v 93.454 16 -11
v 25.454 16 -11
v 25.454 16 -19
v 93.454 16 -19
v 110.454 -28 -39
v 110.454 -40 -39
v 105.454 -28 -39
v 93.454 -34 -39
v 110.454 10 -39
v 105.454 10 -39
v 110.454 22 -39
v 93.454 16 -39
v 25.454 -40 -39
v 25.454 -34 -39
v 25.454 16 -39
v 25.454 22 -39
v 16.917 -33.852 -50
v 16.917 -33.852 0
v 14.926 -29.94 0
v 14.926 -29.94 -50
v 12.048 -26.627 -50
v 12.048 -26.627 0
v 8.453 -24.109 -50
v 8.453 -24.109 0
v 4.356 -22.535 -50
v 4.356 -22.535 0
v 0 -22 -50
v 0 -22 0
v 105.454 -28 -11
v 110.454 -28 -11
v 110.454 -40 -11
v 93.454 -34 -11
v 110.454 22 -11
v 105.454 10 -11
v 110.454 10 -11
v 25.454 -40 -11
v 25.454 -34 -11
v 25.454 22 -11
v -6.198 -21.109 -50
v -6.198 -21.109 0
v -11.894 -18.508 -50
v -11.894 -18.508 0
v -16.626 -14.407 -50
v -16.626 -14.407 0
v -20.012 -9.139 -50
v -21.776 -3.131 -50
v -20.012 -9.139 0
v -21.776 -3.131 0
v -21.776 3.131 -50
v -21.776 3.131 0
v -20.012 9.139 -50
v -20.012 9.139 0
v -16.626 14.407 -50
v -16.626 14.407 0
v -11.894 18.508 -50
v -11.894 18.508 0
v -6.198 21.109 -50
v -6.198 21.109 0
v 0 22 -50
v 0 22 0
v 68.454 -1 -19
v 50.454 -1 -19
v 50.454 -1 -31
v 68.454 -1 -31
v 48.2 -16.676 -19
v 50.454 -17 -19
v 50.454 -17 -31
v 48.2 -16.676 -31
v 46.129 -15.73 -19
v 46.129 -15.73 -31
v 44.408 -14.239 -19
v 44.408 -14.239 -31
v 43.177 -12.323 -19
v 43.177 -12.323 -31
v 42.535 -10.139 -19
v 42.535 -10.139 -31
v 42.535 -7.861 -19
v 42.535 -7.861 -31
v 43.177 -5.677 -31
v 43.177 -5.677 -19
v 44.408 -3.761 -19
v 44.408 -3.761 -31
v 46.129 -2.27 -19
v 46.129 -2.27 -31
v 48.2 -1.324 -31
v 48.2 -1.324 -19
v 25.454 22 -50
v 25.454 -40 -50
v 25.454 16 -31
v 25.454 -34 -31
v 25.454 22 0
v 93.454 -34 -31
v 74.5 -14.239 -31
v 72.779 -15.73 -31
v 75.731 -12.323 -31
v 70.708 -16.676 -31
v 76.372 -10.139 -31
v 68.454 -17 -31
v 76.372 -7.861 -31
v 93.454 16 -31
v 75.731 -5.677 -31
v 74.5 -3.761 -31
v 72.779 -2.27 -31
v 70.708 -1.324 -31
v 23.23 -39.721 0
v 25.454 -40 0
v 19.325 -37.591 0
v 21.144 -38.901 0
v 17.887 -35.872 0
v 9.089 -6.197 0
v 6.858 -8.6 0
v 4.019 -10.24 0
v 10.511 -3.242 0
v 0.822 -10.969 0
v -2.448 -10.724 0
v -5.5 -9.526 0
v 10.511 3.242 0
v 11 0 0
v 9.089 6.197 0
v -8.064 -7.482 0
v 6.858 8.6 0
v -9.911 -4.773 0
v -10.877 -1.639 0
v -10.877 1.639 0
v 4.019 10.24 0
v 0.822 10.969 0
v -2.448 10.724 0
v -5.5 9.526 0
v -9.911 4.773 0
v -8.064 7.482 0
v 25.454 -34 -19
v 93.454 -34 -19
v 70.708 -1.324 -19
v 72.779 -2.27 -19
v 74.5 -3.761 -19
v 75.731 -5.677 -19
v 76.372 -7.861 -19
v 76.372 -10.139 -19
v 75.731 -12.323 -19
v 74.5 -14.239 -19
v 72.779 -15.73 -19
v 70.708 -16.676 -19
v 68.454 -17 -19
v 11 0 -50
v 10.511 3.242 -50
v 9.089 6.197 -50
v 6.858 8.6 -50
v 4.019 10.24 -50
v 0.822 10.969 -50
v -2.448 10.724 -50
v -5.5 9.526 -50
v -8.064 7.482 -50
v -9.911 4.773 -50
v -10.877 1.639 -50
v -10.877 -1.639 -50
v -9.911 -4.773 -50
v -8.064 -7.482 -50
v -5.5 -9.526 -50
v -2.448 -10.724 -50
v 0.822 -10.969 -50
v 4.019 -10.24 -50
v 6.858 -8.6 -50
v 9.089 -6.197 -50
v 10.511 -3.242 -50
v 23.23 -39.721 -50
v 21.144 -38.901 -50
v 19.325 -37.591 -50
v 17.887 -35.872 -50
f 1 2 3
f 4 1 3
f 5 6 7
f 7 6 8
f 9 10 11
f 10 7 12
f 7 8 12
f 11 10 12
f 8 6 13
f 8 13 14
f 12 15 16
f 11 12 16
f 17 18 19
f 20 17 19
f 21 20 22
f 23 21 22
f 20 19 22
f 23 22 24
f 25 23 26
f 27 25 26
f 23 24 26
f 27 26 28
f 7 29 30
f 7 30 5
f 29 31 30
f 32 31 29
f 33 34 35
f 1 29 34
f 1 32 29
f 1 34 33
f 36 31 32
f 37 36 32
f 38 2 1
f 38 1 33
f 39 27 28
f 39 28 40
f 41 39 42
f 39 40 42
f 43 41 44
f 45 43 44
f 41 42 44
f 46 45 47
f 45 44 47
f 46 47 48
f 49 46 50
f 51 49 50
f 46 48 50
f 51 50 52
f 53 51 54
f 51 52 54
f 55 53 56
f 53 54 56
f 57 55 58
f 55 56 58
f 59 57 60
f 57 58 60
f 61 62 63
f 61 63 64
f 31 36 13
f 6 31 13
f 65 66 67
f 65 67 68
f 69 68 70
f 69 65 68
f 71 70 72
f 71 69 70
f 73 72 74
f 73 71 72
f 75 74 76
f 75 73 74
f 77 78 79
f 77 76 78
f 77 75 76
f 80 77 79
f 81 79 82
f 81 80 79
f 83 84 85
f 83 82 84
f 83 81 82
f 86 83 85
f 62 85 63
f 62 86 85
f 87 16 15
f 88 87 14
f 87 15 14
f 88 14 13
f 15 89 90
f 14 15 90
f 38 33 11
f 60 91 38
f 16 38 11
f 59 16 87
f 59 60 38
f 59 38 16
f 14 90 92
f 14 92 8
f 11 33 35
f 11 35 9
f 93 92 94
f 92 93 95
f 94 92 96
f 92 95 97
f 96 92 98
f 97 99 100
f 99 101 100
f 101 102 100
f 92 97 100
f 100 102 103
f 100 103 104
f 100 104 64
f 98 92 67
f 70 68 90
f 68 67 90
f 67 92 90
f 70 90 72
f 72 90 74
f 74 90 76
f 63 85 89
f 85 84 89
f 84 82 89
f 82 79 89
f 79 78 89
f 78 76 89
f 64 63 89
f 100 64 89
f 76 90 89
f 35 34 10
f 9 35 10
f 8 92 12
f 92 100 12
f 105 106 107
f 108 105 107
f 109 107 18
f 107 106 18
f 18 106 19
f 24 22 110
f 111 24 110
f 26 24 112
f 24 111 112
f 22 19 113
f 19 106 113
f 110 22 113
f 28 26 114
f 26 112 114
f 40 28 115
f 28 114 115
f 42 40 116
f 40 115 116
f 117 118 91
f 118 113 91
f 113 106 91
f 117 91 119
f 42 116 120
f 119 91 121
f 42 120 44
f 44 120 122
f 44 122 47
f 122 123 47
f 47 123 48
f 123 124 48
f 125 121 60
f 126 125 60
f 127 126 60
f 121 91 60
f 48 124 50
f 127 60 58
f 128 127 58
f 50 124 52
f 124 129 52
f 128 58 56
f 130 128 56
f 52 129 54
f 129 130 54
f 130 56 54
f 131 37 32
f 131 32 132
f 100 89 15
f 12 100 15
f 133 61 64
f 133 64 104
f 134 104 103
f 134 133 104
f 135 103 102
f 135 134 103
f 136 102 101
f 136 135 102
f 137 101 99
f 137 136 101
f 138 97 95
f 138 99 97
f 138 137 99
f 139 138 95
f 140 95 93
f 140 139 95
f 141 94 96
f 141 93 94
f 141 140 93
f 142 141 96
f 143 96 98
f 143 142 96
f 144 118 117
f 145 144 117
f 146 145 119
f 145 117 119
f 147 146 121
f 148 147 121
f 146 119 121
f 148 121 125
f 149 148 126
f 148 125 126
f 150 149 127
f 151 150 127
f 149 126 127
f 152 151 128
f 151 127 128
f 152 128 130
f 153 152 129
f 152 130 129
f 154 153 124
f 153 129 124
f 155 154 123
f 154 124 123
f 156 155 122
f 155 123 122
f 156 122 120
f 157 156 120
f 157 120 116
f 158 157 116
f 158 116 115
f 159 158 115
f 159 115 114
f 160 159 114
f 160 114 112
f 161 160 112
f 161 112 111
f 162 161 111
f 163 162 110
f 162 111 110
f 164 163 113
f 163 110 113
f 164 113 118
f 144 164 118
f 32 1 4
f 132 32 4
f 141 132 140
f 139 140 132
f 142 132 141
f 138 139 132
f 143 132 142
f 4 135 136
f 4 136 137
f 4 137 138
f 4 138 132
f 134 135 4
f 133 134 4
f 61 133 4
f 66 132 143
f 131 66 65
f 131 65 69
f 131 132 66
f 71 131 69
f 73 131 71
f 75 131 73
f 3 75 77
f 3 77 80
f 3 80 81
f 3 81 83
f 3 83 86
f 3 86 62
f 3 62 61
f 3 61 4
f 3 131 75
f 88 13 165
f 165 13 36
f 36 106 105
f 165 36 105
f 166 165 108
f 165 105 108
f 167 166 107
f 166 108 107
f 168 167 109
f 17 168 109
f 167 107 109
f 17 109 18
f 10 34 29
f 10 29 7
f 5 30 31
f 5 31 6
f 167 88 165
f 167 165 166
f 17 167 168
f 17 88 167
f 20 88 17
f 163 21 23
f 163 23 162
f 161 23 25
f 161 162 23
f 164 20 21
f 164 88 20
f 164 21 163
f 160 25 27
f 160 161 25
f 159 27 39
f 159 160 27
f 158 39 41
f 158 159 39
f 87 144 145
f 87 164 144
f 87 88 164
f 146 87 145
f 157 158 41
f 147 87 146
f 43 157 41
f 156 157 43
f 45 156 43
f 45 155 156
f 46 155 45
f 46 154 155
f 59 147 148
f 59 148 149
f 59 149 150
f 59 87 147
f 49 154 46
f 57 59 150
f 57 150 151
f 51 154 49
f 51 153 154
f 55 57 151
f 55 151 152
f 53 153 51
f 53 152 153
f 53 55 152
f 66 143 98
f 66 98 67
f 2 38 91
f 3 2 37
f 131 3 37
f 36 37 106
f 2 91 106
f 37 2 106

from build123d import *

# Parameters (mm, degrees)
SKETCH1_R           = 11
BOSS_EXTRUDE1_DEPTH = 50
SKETCH2_W           = 28
SKETCH2_H           = 6
BOSS_EXTRUDE2_DEPTH = 68
SKETCH3_W           = 12
SKETCH3_H           = 50
BOSS_EXTRUDE3_DEPTH = 68
SKETCH4_W           = 28
SKETCH4_H           = 62
BOSS_EXTRUDE4_DEPTH = 12
SKETCH5_W           = 28
SKETCH5_H           = 12
BOSS_EXTRUDE5_DEPTH = 5
CUT_EXTRUDE1_DEPTH  = 122.49490099


with BuildPart() as part:
    # Sketch1 → Boss-Extrude1 (new body)
    with BuildSketch(Plane.XY):
        with BuildLine():
            Line((0, 22), (25.453659816, 22))
            Line((25.453659816, 22), (25.453659816, -40))
            ThreePointArc((25.453659816, -40), (20.193625944, -38.302879135), (16.917350568, -33.851565259))
            ThreePointArc((16.917350568, -33.851565259), (10.327830718, -25.257682927), (0, -22))
            ThreePointArc((0, -22), (-22, 0), (0, 22))
        make_face()
        Circle(SKETCH1_R, mode=Mode.SUBTRACT)
    extrude(amount=-BOSS_EXTRUDE1_DEPTH)

    # Sketch2 → Boss-Extrude2 (add)
    with BuildSketch(Plane(origin=(25.453659816, 0, 0), x_dir=(0, 0, -1), z_dir=(1, 0, 0))):
        with Locations((25, 19)):
            Rectangle(SKETCH2_W, SKETCH2_H)
        with Locations((25, -37)):
            Rectangle(SKETCH2_W, SKETCH2_H)
    extrude(amount=BOSS_EXTRUDE2_DEPTH)

    # Sketch3 → Boss-Extrude3 (add)
    with BuildSketch(Plane(origin=(25.453659816, 0, 0), x_dir=(0, 0, -1), z_dir=(1, 0, 0))):
        with Locations((25, -9)):
            Rectangle(SKETCH3_W, SKETCH3_H)
    extrude(amount=BOSS_EXTRUDE3_DEPTH)

    # Sketch4 → Boss-Extrude4 (add)
    with BuildSketch(Plane(origin=(93.453659816, 0, 0), x_dir=(0, 0, -1), z_dir=(1, 0, 0))):
        with Locations((25, -9)):
            Rectangle(SKETCH4_W, SKETCH4_H)
    extrude(amount=BOSS_EXTRUDE4_DEPTH)

    # Sketch5 → Boss-Extrude5 (add)
    with BuildSketch(Plane(origin=(105.453659816, 0, 0), x_dir=(0, 0, -1), z_dir=(1, 0, 0))):
        with Locations((25, 16)):
            Rectangle(SKETCH5_W, SKETCH5_H)
        with Locations((25, -34)):
            Rectangle(SKETCH5_W, SKETCH5_H)
    extrude(amount=BOSS_EXTRUDE5_DEPTH)

    # Sketch8 → Cut-Extrude1 (cut, through all)
    with BuildSketch(Plane.XY.offset(-19)):
        with BuildLine():
            Line((50.453659816, -1), (68.453659816, -1))
            ThreePointArc((68.453659816, -1), (76.453659816, -9), (68.453659816, -17))
            Line((68.453659816, -17), (50.453659816, -17))
            ThreePointArc((50.453659816, -17), (42.453659816, -9), (50.453659816, -1))
        make_face()
    extrude(amount=-CUT_EXTRUDE1_DEPTH, mode=Mode.SUBTRACT)


solid = part.part
